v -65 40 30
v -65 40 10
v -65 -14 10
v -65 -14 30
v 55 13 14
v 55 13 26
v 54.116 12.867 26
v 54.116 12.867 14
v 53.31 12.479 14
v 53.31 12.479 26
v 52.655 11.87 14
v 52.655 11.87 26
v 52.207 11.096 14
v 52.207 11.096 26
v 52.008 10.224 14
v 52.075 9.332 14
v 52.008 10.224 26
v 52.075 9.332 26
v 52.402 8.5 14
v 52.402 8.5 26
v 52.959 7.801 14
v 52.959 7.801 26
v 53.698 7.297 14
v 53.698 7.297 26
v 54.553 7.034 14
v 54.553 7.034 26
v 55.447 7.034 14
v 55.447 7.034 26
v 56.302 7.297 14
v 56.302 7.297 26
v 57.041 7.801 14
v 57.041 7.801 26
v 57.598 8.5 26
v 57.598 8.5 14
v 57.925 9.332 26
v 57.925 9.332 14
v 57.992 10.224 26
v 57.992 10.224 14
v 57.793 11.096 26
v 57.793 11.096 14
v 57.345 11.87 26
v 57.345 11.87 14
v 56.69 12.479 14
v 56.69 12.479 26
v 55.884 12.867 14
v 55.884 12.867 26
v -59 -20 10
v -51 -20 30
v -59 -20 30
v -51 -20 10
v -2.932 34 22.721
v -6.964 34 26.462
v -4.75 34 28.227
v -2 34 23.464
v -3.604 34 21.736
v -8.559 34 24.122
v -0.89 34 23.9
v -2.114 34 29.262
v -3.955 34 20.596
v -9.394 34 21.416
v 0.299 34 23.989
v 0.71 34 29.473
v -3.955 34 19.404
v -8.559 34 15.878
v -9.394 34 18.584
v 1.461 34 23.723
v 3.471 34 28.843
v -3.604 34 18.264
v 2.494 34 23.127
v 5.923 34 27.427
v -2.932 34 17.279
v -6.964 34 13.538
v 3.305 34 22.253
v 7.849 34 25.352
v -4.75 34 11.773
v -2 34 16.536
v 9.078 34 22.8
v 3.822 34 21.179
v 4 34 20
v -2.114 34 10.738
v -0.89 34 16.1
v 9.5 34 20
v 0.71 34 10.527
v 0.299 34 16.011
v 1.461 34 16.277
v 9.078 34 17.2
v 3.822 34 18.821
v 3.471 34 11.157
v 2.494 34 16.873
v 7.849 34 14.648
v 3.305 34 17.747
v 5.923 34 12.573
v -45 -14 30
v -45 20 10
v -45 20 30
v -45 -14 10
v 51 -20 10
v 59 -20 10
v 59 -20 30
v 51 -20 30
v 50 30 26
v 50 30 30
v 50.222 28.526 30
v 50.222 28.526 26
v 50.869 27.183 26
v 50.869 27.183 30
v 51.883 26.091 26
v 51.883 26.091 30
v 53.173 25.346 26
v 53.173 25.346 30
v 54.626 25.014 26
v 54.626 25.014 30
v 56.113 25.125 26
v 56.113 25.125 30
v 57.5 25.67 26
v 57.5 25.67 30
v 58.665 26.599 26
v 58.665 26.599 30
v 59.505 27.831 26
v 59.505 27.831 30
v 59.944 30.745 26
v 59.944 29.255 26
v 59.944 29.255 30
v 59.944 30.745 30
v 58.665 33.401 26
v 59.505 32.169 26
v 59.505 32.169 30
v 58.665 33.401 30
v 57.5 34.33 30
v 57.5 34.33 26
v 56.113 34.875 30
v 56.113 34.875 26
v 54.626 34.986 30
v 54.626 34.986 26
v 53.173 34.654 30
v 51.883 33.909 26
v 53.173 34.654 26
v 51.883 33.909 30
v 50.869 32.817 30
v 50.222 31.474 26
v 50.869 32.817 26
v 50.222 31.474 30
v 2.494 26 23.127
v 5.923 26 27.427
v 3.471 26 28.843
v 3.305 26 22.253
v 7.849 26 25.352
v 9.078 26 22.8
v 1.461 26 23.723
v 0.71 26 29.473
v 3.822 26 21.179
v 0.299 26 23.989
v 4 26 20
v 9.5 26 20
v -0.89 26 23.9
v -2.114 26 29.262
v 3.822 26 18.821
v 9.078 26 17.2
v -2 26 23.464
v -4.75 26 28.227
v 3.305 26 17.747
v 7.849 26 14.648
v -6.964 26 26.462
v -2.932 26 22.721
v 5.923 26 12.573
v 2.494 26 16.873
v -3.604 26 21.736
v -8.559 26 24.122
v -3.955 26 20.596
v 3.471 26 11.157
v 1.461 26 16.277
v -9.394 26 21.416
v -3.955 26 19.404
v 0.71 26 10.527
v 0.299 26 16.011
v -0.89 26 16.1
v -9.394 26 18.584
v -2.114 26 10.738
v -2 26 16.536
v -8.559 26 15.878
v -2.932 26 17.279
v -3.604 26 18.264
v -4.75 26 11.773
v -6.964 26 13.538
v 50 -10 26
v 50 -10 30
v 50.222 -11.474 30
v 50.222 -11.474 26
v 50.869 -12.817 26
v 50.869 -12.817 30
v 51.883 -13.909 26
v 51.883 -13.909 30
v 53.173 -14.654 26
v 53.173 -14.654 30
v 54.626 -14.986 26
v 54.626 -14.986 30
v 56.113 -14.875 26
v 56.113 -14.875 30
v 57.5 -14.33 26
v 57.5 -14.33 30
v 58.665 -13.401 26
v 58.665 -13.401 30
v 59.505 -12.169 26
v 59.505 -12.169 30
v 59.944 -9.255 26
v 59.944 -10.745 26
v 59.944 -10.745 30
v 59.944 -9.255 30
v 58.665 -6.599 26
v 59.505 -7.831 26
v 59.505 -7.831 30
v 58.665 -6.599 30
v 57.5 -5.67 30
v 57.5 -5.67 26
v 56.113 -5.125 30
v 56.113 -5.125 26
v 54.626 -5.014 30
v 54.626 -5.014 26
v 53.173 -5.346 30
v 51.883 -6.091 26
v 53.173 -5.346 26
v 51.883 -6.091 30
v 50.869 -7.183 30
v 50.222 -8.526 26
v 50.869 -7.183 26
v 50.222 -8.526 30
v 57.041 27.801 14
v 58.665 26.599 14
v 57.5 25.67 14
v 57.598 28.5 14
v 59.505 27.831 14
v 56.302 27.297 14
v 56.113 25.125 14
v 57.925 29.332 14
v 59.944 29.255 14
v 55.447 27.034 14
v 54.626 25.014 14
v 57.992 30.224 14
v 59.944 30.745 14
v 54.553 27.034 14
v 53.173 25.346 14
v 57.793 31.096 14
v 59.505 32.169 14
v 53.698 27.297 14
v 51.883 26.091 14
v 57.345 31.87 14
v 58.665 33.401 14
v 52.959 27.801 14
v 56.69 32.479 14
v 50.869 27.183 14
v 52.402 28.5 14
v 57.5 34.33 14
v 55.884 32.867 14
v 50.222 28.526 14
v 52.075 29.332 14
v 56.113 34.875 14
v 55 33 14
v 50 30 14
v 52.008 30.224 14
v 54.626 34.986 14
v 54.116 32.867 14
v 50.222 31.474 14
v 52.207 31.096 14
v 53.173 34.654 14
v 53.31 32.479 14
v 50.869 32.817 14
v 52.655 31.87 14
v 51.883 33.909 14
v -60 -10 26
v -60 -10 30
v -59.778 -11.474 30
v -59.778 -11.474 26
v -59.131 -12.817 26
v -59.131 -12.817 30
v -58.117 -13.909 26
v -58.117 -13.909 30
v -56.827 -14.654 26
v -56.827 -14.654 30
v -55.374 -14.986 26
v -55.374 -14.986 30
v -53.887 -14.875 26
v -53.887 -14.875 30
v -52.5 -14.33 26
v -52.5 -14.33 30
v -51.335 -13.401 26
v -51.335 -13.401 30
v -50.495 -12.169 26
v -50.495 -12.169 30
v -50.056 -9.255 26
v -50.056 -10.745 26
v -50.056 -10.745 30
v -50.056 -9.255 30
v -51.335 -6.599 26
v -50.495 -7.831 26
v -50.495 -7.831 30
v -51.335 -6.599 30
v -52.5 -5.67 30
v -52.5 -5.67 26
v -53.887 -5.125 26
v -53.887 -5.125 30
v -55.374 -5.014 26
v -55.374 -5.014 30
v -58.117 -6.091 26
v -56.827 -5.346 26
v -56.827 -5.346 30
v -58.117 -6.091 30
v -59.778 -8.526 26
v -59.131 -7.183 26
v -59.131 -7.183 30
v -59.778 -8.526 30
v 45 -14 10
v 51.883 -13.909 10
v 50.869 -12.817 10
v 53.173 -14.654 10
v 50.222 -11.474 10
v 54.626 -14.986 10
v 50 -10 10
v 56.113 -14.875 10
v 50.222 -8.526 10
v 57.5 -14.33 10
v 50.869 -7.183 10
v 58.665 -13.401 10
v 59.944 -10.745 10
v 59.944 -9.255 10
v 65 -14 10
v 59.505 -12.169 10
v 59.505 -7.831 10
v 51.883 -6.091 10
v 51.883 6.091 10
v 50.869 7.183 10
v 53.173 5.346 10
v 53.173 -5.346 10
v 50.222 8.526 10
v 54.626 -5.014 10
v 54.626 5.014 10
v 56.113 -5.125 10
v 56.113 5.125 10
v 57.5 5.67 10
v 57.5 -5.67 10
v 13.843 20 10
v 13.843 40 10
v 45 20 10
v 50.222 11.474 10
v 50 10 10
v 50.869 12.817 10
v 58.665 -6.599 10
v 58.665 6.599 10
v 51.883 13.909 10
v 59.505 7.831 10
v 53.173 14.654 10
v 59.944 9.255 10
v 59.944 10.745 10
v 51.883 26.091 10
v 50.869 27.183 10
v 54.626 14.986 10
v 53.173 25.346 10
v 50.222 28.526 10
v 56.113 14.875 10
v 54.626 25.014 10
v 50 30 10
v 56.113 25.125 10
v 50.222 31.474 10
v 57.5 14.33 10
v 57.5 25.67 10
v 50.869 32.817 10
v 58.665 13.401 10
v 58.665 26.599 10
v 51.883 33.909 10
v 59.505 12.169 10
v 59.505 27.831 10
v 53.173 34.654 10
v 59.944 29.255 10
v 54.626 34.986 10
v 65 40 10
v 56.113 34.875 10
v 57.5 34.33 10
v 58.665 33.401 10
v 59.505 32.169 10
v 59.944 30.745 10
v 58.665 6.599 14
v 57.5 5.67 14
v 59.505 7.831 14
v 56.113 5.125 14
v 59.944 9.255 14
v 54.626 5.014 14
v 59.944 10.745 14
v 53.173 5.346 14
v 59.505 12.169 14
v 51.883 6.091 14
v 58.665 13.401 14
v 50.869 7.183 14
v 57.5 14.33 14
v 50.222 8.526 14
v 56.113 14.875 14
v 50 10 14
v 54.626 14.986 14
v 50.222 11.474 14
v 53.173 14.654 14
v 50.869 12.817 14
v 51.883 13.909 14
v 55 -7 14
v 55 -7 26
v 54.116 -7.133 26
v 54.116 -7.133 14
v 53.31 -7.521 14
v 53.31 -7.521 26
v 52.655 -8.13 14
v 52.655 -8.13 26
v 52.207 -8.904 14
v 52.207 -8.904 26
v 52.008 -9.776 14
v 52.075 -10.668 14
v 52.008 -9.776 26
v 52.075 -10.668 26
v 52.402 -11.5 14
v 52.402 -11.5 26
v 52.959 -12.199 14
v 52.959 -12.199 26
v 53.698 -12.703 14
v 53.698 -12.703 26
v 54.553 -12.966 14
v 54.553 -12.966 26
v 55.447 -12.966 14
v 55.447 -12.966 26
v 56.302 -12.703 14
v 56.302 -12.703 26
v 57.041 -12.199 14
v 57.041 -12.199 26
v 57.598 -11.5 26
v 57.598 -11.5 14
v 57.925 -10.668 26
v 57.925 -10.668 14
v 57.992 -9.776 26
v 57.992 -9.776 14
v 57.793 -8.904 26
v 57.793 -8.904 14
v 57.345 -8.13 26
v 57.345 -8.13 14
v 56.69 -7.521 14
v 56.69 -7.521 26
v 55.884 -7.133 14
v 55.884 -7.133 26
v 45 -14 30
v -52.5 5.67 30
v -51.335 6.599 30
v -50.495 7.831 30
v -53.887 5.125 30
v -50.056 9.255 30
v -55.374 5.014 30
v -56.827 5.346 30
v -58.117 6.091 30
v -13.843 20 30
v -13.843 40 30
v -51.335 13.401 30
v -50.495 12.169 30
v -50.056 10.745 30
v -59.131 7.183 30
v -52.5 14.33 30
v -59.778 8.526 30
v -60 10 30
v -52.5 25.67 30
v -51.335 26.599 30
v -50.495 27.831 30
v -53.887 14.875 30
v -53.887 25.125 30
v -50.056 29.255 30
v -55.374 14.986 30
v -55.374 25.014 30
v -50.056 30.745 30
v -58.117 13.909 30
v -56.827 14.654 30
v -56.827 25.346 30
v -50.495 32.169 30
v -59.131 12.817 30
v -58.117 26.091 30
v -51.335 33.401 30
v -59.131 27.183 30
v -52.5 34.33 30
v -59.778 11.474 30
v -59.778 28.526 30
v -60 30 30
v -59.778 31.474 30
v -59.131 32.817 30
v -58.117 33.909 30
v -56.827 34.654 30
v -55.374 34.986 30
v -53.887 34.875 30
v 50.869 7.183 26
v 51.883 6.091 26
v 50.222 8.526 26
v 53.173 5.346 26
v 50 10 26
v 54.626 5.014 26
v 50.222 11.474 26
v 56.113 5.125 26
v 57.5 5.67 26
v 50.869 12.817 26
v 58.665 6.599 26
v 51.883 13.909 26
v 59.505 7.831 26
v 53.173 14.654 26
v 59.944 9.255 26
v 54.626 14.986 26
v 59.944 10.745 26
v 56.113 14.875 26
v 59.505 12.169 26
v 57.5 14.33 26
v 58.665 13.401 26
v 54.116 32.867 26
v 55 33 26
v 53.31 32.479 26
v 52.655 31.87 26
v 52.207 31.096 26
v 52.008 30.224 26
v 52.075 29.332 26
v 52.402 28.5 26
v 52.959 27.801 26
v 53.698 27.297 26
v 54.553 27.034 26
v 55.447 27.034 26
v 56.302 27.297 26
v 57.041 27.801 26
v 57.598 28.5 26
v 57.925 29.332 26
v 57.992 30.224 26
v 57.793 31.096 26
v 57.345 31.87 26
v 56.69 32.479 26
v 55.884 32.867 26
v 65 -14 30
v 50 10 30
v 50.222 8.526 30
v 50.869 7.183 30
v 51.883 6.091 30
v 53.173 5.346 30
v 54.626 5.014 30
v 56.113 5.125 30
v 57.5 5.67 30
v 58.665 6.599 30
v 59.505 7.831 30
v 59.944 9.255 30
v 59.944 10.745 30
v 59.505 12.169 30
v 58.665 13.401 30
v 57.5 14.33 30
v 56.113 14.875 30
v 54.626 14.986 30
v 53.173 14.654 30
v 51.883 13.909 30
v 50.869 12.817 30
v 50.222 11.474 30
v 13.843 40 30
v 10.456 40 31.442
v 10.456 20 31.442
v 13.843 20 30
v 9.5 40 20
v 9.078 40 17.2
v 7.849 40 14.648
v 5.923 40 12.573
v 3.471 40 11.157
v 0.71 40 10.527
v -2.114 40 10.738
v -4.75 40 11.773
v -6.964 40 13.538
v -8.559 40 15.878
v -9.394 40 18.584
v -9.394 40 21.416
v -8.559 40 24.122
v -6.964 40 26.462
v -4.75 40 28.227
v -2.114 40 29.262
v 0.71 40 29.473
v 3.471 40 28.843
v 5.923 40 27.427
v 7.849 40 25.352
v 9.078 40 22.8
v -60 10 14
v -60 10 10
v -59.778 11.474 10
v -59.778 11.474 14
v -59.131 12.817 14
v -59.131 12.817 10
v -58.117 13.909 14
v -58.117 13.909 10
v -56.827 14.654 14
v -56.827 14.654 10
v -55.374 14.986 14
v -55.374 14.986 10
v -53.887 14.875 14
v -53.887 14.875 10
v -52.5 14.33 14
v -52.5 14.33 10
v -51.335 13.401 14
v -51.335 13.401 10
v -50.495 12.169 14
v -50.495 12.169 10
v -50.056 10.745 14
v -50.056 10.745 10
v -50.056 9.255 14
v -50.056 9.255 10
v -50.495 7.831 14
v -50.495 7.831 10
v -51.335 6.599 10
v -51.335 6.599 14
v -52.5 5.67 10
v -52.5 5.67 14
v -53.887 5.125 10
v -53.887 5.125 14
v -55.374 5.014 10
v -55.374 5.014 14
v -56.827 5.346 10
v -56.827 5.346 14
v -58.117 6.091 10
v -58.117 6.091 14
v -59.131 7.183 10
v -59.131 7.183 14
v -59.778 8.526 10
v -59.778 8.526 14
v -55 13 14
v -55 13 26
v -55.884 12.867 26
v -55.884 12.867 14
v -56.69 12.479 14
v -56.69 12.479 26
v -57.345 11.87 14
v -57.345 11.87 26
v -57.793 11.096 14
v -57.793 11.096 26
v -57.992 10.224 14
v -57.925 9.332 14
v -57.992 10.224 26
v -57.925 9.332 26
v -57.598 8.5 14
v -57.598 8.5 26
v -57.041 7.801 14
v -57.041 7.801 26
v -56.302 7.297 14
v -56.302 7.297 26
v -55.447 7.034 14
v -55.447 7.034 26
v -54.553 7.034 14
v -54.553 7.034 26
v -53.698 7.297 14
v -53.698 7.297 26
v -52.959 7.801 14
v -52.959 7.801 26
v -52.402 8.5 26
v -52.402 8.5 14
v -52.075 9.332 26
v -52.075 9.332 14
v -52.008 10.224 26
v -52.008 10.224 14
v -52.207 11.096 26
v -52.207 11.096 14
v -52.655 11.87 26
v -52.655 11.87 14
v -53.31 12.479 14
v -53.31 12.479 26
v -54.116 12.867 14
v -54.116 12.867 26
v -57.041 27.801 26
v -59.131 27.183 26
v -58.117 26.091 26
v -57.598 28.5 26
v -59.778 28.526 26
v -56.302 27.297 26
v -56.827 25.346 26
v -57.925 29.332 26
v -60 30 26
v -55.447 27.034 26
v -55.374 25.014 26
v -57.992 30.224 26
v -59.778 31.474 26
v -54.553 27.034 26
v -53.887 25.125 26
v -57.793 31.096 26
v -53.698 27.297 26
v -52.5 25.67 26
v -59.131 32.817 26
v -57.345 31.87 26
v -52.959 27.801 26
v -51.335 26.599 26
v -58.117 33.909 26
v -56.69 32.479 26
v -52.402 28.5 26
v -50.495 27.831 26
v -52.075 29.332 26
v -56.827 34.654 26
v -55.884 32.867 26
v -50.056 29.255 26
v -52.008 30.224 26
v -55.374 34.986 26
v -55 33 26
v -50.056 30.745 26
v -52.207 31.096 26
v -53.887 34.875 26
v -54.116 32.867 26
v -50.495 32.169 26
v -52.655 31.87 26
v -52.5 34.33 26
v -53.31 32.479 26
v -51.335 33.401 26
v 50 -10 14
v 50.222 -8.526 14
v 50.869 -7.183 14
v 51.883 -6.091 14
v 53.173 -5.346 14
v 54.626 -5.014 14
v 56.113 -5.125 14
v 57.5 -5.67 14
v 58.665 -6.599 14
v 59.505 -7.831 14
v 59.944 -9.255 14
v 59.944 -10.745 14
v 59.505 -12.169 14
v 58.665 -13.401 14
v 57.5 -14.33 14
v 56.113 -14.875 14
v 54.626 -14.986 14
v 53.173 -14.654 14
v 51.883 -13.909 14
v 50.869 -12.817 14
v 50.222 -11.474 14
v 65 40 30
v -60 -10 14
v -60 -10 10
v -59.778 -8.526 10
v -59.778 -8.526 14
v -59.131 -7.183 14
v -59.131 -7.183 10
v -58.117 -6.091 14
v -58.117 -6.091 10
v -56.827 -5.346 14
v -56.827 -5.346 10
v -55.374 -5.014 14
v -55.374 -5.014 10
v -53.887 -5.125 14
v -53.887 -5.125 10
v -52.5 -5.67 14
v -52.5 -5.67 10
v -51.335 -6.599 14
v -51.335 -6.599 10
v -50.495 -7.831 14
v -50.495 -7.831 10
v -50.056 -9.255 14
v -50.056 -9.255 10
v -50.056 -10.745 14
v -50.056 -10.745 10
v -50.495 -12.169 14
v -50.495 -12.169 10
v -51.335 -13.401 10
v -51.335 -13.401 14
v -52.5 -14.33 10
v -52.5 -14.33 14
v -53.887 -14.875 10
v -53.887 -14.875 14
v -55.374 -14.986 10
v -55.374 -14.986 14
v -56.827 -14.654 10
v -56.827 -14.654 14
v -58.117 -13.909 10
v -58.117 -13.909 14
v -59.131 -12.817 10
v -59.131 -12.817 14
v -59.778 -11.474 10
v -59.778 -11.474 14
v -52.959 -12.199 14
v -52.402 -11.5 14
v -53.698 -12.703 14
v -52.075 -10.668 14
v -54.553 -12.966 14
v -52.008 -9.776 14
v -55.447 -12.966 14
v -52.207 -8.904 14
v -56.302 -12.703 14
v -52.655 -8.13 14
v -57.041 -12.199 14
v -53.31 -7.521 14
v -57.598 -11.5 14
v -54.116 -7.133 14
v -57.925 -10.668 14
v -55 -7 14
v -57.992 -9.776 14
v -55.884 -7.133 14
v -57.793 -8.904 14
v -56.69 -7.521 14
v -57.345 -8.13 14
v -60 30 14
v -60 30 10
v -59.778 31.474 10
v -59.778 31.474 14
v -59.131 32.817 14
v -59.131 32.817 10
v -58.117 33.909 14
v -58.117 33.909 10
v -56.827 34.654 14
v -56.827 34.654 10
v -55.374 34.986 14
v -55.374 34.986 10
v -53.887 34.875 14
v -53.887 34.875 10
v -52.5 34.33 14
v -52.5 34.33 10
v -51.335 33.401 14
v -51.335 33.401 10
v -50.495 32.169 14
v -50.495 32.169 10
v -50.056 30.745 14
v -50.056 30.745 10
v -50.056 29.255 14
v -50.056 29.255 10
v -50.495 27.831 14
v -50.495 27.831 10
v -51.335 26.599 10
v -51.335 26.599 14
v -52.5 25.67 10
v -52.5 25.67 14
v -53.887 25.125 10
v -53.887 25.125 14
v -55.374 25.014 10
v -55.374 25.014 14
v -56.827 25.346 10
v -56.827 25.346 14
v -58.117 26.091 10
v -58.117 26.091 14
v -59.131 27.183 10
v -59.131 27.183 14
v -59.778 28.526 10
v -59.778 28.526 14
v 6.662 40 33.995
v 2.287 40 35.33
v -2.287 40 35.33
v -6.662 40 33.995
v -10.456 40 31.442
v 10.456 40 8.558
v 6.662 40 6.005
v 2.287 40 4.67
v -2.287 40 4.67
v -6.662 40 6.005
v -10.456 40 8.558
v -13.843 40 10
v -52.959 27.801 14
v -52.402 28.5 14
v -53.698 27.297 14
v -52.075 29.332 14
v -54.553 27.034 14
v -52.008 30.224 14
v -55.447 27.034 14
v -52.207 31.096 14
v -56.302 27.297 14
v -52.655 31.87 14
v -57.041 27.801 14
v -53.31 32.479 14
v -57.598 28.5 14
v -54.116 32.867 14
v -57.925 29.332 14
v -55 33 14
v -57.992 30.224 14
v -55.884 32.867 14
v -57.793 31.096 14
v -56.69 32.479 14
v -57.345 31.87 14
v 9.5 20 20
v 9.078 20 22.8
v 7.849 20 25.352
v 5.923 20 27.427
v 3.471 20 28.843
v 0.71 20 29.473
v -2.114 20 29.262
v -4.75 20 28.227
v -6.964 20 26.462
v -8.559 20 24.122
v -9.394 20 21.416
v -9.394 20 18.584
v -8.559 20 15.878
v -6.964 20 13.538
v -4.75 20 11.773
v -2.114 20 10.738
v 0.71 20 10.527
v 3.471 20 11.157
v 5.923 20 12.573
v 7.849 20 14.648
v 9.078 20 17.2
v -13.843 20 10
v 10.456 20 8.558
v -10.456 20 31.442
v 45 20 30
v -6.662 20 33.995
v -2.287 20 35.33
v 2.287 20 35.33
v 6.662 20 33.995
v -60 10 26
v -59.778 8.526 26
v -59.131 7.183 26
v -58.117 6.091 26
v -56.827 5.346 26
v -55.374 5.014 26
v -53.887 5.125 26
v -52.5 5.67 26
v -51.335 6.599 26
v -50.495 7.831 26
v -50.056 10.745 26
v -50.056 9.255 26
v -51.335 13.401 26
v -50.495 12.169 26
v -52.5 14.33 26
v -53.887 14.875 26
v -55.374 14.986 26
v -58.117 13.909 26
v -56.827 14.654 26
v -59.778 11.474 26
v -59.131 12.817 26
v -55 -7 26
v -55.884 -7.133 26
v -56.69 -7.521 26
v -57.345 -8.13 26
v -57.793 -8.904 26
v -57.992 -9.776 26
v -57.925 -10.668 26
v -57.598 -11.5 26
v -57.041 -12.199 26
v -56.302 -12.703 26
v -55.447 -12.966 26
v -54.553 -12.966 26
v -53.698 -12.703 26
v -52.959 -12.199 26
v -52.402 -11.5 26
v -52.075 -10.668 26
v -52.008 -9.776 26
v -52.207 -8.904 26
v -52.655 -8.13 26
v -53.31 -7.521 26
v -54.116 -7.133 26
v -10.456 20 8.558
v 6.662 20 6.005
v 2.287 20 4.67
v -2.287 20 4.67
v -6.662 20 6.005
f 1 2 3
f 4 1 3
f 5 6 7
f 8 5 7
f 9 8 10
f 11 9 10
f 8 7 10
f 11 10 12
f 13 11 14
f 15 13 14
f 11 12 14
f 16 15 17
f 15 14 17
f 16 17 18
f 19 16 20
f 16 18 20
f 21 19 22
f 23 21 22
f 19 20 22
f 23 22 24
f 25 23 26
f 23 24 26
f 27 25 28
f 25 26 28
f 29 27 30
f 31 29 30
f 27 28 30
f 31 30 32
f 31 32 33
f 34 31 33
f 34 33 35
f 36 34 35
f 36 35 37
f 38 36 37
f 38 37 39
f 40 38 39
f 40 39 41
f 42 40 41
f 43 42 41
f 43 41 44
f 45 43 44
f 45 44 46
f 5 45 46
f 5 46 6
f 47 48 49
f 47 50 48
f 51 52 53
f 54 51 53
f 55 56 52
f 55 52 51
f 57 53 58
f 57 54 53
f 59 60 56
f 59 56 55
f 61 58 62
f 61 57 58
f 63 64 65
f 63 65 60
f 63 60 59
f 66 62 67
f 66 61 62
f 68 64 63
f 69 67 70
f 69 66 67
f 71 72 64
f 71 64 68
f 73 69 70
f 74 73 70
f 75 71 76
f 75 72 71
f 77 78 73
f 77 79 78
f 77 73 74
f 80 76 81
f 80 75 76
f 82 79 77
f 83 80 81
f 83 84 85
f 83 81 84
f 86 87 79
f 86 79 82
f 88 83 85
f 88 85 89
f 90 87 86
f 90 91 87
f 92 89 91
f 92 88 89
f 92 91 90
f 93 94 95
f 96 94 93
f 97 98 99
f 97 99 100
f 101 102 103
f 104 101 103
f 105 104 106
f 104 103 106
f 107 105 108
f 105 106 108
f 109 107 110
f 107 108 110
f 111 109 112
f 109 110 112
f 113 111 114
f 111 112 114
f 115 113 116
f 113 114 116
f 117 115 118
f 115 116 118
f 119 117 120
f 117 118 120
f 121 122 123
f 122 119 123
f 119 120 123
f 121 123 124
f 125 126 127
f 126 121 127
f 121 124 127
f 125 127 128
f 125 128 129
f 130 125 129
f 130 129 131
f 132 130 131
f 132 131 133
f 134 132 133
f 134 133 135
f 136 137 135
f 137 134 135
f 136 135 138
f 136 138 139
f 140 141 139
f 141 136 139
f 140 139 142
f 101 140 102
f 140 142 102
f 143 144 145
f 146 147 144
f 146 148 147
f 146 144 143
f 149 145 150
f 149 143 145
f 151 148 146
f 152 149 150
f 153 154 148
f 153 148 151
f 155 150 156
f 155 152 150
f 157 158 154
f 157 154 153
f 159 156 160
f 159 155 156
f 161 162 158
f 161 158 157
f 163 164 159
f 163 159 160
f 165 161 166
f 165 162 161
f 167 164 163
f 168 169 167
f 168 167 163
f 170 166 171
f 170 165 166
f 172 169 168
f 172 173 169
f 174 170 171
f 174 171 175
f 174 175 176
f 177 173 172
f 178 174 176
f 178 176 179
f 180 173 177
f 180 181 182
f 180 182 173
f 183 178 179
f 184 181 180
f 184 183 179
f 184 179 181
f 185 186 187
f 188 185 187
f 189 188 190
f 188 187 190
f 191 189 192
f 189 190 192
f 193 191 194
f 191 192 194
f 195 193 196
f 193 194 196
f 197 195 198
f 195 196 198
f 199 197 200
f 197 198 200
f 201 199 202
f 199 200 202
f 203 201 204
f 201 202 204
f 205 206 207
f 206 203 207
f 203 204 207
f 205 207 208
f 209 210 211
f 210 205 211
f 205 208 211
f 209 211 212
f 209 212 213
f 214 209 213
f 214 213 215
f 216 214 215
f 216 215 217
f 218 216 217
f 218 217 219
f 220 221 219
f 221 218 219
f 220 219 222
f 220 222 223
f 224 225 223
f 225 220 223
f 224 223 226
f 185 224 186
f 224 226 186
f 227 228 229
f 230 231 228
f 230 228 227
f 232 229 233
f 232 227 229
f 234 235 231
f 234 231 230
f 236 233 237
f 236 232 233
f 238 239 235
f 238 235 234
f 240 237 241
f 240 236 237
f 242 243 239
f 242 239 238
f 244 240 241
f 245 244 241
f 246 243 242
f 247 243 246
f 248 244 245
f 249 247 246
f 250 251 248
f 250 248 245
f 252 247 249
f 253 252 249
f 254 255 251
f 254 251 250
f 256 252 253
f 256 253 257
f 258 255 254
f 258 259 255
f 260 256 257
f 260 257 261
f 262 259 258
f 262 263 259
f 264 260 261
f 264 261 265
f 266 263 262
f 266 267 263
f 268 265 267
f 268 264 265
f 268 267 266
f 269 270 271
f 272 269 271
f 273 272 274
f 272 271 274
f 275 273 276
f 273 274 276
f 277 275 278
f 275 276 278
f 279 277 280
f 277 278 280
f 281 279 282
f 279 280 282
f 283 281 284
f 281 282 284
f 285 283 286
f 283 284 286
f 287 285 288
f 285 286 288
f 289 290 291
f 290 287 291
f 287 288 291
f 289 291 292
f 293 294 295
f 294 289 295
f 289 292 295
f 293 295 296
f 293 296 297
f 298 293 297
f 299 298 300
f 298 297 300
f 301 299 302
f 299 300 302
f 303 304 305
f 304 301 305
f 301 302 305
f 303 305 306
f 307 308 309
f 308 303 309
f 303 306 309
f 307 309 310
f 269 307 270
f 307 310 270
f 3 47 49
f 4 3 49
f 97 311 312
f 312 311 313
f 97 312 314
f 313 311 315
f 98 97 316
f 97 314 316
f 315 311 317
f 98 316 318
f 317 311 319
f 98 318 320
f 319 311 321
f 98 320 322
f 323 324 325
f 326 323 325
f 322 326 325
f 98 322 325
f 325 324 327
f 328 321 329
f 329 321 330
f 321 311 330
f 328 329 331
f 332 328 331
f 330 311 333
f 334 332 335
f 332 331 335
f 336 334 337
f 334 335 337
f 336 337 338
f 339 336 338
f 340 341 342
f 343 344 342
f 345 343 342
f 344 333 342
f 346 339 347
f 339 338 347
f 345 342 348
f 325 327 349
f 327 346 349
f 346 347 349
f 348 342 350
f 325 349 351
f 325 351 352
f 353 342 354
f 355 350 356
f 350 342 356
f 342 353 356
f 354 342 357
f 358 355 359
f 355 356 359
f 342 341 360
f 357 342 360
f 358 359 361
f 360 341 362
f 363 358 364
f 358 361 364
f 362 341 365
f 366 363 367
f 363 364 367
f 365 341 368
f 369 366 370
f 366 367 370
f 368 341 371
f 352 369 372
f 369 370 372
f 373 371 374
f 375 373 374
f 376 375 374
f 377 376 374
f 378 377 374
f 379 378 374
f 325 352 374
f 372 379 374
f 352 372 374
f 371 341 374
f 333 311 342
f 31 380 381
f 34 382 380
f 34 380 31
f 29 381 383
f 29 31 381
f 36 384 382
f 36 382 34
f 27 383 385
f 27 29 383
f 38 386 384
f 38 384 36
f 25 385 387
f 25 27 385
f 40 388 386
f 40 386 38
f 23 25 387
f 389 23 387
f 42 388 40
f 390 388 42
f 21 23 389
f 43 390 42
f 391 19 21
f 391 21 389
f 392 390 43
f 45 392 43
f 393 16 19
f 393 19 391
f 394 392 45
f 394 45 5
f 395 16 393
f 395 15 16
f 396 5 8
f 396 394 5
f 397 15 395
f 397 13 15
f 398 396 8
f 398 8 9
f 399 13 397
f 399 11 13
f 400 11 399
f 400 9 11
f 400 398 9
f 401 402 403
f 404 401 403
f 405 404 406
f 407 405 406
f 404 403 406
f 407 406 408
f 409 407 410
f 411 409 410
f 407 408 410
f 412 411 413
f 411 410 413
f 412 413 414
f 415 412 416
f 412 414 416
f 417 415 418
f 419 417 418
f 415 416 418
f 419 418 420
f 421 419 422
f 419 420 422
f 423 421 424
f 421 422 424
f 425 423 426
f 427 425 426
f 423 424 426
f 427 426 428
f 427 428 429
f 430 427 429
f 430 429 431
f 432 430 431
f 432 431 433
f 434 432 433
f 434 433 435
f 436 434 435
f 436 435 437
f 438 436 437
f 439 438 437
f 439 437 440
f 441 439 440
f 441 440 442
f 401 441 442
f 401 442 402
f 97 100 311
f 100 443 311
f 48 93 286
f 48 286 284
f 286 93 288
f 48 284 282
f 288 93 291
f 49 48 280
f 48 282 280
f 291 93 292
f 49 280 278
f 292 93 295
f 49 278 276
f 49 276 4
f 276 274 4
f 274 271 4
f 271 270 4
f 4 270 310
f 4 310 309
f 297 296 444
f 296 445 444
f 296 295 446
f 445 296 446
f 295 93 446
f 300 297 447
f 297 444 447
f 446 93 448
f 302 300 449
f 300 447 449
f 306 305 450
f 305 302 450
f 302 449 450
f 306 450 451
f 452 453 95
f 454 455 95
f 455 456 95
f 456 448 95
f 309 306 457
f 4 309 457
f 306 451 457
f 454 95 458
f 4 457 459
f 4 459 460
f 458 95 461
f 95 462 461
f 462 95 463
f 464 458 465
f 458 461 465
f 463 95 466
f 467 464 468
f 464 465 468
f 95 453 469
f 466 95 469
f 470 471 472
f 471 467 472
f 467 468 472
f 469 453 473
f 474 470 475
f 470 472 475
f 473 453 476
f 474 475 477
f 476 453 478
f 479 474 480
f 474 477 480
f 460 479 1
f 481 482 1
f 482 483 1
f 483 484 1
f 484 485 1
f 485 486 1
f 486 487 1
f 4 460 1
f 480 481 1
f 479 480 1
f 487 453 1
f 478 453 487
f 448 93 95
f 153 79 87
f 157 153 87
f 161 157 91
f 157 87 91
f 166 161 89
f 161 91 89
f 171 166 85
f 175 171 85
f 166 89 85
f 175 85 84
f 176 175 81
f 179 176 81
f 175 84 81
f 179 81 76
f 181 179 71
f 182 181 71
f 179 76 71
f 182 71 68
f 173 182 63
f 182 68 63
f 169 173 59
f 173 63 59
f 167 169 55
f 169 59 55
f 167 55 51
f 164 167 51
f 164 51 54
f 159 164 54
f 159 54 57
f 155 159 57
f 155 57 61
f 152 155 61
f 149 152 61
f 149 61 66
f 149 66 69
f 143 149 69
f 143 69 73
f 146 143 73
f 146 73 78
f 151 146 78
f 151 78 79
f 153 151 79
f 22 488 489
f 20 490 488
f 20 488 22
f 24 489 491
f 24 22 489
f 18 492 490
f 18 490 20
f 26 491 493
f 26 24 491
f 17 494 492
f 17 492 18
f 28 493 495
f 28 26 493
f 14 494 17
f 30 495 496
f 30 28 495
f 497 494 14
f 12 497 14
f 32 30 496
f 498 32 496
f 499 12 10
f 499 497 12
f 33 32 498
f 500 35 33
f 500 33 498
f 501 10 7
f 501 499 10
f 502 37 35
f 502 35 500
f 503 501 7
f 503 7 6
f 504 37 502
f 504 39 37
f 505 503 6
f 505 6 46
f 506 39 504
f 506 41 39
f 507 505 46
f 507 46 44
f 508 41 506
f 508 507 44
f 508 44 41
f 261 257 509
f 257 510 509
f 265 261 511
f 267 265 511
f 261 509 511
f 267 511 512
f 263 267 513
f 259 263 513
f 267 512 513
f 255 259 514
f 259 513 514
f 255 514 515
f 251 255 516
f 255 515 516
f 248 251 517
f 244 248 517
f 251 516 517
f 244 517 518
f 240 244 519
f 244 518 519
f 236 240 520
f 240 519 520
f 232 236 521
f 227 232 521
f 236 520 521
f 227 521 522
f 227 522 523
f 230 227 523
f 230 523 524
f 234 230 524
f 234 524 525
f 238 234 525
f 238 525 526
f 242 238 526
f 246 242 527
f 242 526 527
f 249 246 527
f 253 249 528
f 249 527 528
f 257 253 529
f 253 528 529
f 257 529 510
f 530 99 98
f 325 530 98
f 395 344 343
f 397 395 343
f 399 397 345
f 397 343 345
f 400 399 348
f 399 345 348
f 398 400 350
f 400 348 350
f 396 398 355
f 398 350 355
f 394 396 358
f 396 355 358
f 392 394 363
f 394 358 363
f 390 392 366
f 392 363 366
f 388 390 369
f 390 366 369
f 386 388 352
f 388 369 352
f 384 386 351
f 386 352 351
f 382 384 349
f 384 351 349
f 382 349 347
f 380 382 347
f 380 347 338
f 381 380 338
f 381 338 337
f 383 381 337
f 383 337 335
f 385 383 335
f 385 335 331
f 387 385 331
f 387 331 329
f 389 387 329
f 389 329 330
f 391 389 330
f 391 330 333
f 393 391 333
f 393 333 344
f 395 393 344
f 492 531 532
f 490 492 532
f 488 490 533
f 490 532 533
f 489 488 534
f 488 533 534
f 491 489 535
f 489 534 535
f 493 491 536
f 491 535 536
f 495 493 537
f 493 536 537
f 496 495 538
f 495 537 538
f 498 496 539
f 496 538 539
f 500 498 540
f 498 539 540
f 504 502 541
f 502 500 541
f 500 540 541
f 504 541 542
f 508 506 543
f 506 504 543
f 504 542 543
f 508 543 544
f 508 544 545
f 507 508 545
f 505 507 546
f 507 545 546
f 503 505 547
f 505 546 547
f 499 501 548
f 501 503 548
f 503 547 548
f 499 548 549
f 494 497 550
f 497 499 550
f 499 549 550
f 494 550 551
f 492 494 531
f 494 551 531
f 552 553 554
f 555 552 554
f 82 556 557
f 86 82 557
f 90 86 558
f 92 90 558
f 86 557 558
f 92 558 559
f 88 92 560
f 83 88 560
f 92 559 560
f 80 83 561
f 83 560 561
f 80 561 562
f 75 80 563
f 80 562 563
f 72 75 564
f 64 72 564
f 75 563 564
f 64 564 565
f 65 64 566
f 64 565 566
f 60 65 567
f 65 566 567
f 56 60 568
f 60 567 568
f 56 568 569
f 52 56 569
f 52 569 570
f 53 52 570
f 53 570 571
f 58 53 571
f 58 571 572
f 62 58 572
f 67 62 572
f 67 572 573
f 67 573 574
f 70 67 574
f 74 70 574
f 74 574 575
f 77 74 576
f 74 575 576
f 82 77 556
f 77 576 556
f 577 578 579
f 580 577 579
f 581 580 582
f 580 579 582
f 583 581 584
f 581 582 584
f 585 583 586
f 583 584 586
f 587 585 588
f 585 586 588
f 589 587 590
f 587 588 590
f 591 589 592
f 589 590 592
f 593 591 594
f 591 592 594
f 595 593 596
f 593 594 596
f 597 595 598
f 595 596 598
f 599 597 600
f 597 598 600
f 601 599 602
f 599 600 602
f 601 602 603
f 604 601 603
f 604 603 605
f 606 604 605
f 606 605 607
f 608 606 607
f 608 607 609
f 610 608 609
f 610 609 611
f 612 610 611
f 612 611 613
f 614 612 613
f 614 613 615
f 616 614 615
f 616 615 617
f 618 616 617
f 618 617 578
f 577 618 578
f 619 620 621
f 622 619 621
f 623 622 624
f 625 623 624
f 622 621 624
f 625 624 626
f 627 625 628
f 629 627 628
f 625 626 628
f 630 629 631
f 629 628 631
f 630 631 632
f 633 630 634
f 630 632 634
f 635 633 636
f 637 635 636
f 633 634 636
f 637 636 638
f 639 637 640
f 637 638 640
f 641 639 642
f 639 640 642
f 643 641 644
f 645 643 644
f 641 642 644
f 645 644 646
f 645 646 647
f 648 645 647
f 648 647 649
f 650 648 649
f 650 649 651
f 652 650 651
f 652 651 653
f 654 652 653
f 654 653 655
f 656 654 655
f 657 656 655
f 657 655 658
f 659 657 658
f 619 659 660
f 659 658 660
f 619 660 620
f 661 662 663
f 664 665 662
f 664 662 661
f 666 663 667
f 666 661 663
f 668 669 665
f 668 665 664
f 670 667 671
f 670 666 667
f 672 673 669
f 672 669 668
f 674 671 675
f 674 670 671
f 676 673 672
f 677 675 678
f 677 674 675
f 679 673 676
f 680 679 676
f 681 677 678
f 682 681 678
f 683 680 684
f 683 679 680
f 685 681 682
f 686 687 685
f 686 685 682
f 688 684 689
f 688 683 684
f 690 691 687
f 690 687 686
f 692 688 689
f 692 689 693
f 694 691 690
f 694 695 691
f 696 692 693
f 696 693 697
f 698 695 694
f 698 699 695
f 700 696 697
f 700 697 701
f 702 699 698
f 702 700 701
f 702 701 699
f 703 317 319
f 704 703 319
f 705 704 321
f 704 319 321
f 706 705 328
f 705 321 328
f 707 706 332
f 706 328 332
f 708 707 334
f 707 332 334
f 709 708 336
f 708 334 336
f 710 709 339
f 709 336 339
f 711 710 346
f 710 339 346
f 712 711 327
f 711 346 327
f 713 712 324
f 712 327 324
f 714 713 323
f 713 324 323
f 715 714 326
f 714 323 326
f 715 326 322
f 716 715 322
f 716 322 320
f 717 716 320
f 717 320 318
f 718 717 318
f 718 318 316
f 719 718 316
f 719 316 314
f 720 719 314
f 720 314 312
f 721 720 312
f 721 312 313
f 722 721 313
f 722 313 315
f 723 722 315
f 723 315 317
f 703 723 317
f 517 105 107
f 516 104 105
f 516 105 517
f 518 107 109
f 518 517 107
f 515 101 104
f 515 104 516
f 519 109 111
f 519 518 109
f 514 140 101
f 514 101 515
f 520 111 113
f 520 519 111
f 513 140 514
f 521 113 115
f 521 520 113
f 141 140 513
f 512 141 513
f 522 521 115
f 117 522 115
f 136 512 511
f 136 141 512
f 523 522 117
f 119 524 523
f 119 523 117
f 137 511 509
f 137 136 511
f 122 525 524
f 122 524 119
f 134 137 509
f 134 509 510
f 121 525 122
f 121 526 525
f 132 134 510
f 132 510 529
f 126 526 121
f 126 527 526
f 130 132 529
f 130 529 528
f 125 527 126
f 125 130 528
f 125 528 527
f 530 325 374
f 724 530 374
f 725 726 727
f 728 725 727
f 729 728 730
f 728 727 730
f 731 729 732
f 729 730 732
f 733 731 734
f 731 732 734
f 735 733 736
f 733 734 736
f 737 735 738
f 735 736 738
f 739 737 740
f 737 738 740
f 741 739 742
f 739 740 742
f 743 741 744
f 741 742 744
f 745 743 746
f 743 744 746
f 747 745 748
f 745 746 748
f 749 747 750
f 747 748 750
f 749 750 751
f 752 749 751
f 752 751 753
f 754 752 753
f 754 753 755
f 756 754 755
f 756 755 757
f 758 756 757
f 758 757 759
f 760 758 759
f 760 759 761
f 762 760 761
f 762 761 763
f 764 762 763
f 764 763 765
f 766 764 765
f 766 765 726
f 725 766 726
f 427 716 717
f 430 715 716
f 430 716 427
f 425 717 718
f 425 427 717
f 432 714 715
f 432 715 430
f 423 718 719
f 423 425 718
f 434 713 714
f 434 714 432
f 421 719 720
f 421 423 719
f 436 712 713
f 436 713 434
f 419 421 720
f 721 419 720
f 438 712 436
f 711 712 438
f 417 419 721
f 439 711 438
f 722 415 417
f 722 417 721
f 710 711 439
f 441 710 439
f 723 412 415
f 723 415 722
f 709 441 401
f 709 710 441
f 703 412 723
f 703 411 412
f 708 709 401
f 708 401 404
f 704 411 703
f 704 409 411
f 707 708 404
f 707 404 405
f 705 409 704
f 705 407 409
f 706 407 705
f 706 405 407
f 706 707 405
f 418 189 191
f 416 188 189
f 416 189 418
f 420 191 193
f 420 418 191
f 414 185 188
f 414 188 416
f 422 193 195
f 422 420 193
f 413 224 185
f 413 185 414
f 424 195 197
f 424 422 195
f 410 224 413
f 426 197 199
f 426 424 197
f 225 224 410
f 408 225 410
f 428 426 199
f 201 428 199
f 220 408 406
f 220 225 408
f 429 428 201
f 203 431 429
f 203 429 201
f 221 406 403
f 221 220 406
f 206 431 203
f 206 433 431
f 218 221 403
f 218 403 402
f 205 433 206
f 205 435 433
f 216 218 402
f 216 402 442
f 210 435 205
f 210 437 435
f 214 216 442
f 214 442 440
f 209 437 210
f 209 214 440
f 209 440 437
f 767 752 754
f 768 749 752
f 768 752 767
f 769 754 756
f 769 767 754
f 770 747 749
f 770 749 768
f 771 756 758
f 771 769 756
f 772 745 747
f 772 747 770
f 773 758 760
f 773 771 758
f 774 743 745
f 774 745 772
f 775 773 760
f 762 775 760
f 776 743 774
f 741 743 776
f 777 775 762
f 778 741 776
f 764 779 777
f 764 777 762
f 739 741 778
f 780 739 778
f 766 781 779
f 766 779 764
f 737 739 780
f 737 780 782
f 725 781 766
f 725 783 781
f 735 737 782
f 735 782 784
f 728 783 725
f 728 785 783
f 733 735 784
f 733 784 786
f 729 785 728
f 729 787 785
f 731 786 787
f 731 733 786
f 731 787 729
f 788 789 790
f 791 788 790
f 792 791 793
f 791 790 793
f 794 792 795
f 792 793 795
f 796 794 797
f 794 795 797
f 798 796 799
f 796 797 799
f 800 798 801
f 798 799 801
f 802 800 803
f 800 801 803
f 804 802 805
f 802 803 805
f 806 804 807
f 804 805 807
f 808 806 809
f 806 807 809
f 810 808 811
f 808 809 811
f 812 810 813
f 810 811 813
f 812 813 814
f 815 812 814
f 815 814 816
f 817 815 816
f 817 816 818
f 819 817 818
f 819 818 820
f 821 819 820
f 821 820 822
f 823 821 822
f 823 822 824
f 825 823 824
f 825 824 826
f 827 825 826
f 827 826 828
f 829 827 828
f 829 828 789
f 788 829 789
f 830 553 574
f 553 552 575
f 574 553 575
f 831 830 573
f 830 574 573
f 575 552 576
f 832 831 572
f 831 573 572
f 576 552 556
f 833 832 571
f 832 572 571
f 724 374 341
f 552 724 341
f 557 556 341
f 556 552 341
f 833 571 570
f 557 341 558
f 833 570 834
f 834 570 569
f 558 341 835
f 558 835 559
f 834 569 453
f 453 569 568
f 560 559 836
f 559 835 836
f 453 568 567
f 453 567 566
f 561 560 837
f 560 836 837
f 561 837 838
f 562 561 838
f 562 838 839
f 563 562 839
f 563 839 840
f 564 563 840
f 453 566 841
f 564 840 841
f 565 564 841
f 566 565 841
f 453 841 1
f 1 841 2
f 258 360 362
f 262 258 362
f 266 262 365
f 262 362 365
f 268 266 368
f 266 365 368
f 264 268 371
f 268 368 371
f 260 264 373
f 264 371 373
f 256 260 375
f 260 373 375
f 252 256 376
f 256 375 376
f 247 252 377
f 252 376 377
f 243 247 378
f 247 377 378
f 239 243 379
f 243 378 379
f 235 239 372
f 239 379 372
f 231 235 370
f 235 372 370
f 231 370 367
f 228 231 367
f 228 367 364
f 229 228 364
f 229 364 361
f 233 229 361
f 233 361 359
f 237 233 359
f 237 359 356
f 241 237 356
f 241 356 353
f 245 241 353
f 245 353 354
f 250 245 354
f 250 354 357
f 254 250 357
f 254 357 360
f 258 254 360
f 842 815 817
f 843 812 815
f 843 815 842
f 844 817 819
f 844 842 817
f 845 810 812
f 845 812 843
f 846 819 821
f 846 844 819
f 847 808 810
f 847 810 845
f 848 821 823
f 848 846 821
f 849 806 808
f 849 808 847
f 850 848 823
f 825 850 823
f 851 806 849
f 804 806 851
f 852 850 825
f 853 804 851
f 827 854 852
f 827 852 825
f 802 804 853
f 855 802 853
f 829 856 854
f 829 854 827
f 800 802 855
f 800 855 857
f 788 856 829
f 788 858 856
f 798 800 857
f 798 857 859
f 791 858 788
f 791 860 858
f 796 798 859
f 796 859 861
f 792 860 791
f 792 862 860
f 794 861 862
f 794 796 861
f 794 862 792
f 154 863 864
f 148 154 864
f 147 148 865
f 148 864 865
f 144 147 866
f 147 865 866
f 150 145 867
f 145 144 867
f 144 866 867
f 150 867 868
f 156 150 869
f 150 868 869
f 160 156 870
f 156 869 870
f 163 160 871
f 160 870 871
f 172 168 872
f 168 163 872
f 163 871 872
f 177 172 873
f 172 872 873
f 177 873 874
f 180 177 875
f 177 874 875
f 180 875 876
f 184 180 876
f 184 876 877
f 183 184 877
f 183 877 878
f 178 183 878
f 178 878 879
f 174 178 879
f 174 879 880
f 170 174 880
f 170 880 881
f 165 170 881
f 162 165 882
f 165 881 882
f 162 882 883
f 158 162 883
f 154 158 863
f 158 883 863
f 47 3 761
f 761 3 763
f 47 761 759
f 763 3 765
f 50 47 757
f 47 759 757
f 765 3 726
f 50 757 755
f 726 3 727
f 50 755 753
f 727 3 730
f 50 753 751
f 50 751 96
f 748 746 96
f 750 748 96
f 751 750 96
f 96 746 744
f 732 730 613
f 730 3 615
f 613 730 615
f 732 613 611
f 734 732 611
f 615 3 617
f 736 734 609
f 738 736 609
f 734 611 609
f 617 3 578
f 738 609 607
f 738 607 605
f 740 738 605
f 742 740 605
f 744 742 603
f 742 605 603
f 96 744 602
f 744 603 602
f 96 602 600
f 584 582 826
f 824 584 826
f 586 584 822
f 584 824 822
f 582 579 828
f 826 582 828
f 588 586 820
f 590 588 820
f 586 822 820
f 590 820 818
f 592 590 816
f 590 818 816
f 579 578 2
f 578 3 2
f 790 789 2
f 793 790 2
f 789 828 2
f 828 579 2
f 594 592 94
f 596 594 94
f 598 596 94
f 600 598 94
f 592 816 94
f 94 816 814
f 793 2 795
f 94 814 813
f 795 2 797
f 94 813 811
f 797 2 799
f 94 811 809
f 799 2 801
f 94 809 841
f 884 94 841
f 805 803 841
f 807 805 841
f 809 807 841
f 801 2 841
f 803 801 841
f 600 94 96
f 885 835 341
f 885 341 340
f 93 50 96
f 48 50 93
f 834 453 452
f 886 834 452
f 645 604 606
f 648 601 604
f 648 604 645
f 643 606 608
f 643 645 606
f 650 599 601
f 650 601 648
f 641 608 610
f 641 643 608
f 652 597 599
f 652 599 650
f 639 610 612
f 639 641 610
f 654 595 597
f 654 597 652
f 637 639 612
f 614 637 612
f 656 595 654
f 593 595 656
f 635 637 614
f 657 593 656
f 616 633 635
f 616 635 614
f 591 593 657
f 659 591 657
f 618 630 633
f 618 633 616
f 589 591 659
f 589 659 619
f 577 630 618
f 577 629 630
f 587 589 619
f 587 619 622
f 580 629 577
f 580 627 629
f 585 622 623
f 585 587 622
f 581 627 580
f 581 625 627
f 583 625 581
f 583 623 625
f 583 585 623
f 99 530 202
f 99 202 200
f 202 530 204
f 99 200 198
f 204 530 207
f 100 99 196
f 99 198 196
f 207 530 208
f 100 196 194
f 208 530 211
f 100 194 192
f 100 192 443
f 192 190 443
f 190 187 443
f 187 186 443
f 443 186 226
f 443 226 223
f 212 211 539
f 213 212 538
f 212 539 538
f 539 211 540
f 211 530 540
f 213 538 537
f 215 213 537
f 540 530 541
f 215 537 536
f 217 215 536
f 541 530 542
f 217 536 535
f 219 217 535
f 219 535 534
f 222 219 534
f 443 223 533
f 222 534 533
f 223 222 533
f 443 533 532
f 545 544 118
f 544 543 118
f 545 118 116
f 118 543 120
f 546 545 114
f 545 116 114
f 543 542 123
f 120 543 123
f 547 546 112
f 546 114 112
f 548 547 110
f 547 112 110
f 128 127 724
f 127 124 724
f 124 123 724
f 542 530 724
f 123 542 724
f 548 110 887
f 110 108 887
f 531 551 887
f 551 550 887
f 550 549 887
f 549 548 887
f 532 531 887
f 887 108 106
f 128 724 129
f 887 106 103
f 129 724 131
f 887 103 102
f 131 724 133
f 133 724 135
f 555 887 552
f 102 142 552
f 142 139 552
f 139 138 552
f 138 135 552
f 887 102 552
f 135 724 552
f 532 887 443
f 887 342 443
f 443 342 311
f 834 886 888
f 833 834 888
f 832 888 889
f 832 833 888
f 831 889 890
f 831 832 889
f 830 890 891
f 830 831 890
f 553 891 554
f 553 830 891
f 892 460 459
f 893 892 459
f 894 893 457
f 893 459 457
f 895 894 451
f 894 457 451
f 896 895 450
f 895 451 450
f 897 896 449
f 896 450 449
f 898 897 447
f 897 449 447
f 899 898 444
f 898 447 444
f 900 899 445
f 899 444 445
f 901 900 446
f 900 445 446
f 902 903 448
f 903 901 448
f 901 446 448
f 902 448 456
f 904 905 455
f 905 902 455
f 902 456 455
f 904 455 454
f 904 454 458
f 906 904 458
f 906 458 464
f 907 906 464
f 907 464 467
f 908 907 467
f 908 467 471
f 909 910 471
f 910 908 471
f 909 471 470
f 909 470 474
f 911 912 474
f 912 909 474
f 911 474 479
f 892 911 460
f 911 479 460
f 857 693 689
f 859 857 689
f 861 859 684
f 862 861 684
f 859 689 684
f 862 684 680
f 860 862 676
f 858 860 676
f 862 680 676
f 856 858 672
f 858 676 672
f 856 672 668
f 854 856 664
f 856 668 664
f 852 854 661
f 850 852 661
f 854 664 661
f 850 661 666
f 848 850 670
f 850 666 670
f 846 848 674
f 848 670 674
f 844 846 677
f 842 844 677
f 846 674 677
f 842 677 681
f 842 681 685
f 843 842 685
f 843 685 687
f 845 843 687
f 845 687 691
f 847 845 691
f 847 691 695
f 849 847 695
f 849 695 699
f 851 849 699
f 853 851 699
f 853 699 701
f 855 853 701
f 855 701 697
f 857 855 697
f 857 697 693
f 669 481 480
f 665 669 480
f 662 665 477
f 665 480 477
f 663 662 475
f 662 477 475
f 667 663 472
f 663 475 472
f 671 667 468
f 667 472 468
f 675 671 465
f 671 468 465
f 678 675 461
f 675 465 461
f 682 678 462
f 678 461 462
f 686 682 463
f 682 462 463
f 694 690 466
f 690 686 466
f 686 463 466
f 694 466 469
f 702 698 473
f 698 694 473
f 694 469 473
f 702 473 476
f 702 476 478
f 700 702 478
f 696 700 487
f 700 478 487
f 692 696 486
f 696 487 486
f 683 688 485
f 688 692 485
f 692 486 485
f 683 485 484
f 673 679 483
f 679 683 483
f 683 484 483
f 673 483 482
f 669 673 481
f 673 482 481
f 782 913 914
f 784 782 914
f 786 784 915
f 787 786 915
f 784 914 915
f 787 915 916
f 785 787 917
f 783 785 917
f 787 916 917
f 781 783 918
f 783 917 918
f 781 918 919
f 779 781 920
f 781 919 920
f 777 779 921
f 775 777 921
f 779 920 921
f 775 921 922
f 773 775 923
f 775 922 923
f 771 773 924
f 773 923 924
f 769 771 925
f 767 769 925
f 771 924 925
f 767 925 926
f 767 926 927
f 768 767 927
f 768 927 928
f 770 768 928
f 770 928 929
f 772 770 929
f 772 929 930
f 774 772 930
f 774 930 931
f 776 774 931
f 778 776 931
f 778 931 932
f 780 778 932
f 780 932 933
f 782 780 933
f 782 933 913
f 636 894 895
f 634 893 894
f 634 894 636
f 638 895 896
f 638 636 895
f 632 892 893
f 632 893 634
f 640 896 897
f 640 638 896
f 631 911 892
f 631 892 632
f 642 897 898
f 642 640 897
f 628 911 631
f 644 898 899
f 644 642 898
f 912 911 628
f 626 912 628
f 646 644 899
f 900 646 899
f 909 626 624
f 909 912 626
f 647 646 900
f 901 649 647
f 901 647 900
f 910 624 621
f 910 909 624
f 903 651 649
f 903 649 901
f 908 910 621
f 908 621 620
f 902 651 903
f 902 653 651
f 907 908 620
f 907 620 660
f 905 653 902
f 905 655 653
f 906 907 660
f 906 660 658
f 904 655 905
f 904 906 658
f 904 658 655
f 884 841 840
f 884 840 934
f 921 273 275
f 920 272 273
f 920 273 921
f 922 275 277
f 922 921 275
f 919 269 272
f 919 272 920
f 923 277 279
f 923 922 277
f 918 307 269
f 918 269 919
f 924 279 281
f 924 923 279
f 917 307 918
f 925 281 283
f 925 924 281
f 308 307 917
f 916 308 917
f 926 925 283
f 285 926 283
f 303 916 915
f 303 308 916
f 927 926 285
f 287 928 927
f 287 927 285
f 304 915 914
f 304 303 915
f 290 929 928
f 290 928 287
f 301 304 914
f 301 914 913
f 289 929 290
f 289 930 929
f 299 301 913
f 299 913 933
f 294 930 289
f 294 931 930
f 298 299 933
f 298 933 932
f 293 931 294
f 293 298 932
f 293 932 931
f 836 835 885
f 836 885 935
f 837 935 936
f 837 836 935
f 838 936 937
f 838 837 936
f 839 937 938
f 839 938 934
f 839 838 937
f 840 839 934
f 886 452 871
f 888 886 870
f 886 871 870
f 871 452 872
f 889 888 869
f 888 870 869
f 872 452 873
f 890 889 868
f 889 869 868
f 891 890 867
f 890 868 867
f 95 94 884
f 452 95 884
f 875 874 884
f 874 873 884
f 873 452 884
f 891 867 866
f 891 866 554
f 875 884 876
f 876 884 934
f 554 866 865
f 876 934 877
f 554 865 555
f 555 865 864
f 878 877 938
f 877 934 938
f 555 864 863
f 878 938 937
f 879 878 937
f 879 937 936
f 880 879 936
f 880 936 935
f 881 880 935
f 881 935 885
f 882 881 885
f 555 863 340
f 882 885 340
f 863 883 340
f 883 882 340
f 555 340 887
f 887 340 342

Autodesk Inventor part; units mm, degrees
ref_plane "YZ Plane" through (0, 0, 0) normal (1, 0, 0) x (0, 1, 0)
sketch "Esquisse8" plane through (0, 0, 0) normal (0, 0, 1) x (1, 0, 0)
  line L0 (65, -20) -> (65, 40)
  line L1 (65, 40) -> (-65, 40)
  line L2 (-65, 40) -> (-65, -20)
  line L3 (-45, 20) -> (45, 20)
  line L4 (-45, 20) -> (-45, -20)
  line L5 (45, 20) -> (45, -20)
  line L6 (65, -20) -> (45, -20)
  line L7 (-45, -20) -> (-65, -20)
  point P0 (0, 0)
  dimension "d45" = 20
  dimension "d46" = 90
  dimension "d47" = 45
  dimension "d71" = 20
  dimension "d72" = 20
extrude "Extrusion7" add sketch "Esquisse8" along normal blind 60
sketch "Esquisse10" plane through (0, 0, 0) normal (0, 0, -1) x (-1, 0, 0)
  line L0 (45, 20) -> (-45, 20) projected
  line L1 (-55, 30) -> (-55, 10)
  line L2 (55, 10) -> (55, 30)
  line L3 (-55, 10) -> (-55, -10)
  line L4 (55, 10) -> (55, -10)
  dimension "d75" = 20
  dimension "d80" = 20
  dimension "d89" = 20
  dimension "d90" = 20
hole "Perçage2" at (55, 10, 0) at (-55, 10, 0) at (-55, 30, 0) at (55, 30, 0) at (-55, -10, 0) at (55, -10, 0) direction (0, 0, 1) diameter 6 end through all counterbore diameter 10 counterbore depth 4
sketch "Esquisse13" plane through (-65, 40, 0) normal (0, 1, 0) x (1, 0, 0)
  line L0 (65, 0) -> (65, -20)
  circle A0 centre (65, -20) radius 4
  dimension "d81" = 20
  dimension "d82" = 8
extrude "Extrusion9" cut sketch "Esquisse13" against normal up to surface (20 mm away)
sketch "Esquisse14" plane through (-65, 40, 0) normal (0, 1, 0) x (1, 0, 0)
  circle A0 centre (65, -20) radius 4 projected
  line L0 (0, 0) -> (130, 0) projected
  line L1 (0, 0) -> (0, -60) projected
  line L2 (130, -60) -> (0, -60) projected
  line L3 (130, 0) -> (130, -60) projected
  circle A1 centre (65, -20) radius 9.5
  point P0 (65, 0)
  dimension "d85" = 19
extrude "Extrusion10" cut sketch "Esquisse14" against normal blind 6 contours A1
ref_plane "Plan de construction3" through (-65, 30, 0) normal (0, 1, 0) x (1, 0, 0)
mirror "Symétrie5" about plane through (-65, 30, 0) normal (0, 1, 0) of "Extrusion10"
sketch "Esquisse15" plane through (-65, 40, 0) normal (0, 1, 0) x (1, 0, 0)
  circle A0 centre (65, -20) radius 9.5 projected
  circle A1 centre (65, -20) radius 15.5
  line L0 (130, -60) -> (0, -60) projected
  line L1 (0, 0) -> (130, 0) projected
  line L2 (130, 0) -> (130, -10)
  line L3 (130, -30) -> (130, -60)
  line L4 (0, 0) -> (0, -10)
  line L5 (0, -30) -> (0, -60)
  line L6 (130, -30) -> (76.8427, -30)
  line L7 (53.1573, -30) -> (0, -30)
  line L8 (0, -10) -> (53.1573, -10)
  line L9 (76.8427, -10) -> (130, -10)
  point P0 (65, 0)
  dimension "d91" = 6
extrude "Extrusion11" cut sketch "Esquisse15" against normal through all contours A1 L8 L4 L1 L2 L9 | L6 L3 L0 L5 L7 A1
sketch "Esquisse16" plane through (65, 40, 10) normal (0, 0, -1) x (-1, 0, 0)
  circle A0 centre (10, -50) radius 3 projected
  circle A1 centre (10, -30) radius 3 projected
  circle A2 centre (10, -10) radius 3 projected
  circle A3 centre (120, -10) radius 3 projected
  circle A4 centre (120, -30) radius 3 projected
  circle A5 centre (120, -50) radius 3 projected
  circle A6 centre (10, -50) radius 5
  circle A7 centre (10, -30) radius 5
  circle A8 centre (10, -10) radius 5
  circle A9 centre (120, -10) radius 5
  circle A10 centre (120, -30) radius 5
  circle A11 centre (120, -50) radius 5
  point P0 (65, -40)
  dimension "d96" = 10
  dimension "d97" = 10
extrude "Extrusion12" cut sketch "Esquisse16" against normal blind 4 contours A0 | A1 | A2 | A3 | A4 | A5 | A6 | A7 | A8 | A9 | A10 | A11
ref_plane "Plan de construction4" through (11.8427, 40, 20) normal (0, 0, 1) x (1, 0, 0)
mirror "Symétrie6" about plane through (11.8427, 40, 20) normal (0, 0, 1) of "Extrusion12"
chamfer "Chanfrein1" distance 2 angle 45 4 edges at (11.8427, 30, 10) (11.8427, 30, 30) (-11.8427, 30, 30) (-11.8427, 30, 10)
chamfer "Chanfrein2" distance 6 angle 45 4 edges at (65, -20, 20) (45, -20, 20) (-45, -20, 20) (-65, -20, 20)
properties part number "Block1"
